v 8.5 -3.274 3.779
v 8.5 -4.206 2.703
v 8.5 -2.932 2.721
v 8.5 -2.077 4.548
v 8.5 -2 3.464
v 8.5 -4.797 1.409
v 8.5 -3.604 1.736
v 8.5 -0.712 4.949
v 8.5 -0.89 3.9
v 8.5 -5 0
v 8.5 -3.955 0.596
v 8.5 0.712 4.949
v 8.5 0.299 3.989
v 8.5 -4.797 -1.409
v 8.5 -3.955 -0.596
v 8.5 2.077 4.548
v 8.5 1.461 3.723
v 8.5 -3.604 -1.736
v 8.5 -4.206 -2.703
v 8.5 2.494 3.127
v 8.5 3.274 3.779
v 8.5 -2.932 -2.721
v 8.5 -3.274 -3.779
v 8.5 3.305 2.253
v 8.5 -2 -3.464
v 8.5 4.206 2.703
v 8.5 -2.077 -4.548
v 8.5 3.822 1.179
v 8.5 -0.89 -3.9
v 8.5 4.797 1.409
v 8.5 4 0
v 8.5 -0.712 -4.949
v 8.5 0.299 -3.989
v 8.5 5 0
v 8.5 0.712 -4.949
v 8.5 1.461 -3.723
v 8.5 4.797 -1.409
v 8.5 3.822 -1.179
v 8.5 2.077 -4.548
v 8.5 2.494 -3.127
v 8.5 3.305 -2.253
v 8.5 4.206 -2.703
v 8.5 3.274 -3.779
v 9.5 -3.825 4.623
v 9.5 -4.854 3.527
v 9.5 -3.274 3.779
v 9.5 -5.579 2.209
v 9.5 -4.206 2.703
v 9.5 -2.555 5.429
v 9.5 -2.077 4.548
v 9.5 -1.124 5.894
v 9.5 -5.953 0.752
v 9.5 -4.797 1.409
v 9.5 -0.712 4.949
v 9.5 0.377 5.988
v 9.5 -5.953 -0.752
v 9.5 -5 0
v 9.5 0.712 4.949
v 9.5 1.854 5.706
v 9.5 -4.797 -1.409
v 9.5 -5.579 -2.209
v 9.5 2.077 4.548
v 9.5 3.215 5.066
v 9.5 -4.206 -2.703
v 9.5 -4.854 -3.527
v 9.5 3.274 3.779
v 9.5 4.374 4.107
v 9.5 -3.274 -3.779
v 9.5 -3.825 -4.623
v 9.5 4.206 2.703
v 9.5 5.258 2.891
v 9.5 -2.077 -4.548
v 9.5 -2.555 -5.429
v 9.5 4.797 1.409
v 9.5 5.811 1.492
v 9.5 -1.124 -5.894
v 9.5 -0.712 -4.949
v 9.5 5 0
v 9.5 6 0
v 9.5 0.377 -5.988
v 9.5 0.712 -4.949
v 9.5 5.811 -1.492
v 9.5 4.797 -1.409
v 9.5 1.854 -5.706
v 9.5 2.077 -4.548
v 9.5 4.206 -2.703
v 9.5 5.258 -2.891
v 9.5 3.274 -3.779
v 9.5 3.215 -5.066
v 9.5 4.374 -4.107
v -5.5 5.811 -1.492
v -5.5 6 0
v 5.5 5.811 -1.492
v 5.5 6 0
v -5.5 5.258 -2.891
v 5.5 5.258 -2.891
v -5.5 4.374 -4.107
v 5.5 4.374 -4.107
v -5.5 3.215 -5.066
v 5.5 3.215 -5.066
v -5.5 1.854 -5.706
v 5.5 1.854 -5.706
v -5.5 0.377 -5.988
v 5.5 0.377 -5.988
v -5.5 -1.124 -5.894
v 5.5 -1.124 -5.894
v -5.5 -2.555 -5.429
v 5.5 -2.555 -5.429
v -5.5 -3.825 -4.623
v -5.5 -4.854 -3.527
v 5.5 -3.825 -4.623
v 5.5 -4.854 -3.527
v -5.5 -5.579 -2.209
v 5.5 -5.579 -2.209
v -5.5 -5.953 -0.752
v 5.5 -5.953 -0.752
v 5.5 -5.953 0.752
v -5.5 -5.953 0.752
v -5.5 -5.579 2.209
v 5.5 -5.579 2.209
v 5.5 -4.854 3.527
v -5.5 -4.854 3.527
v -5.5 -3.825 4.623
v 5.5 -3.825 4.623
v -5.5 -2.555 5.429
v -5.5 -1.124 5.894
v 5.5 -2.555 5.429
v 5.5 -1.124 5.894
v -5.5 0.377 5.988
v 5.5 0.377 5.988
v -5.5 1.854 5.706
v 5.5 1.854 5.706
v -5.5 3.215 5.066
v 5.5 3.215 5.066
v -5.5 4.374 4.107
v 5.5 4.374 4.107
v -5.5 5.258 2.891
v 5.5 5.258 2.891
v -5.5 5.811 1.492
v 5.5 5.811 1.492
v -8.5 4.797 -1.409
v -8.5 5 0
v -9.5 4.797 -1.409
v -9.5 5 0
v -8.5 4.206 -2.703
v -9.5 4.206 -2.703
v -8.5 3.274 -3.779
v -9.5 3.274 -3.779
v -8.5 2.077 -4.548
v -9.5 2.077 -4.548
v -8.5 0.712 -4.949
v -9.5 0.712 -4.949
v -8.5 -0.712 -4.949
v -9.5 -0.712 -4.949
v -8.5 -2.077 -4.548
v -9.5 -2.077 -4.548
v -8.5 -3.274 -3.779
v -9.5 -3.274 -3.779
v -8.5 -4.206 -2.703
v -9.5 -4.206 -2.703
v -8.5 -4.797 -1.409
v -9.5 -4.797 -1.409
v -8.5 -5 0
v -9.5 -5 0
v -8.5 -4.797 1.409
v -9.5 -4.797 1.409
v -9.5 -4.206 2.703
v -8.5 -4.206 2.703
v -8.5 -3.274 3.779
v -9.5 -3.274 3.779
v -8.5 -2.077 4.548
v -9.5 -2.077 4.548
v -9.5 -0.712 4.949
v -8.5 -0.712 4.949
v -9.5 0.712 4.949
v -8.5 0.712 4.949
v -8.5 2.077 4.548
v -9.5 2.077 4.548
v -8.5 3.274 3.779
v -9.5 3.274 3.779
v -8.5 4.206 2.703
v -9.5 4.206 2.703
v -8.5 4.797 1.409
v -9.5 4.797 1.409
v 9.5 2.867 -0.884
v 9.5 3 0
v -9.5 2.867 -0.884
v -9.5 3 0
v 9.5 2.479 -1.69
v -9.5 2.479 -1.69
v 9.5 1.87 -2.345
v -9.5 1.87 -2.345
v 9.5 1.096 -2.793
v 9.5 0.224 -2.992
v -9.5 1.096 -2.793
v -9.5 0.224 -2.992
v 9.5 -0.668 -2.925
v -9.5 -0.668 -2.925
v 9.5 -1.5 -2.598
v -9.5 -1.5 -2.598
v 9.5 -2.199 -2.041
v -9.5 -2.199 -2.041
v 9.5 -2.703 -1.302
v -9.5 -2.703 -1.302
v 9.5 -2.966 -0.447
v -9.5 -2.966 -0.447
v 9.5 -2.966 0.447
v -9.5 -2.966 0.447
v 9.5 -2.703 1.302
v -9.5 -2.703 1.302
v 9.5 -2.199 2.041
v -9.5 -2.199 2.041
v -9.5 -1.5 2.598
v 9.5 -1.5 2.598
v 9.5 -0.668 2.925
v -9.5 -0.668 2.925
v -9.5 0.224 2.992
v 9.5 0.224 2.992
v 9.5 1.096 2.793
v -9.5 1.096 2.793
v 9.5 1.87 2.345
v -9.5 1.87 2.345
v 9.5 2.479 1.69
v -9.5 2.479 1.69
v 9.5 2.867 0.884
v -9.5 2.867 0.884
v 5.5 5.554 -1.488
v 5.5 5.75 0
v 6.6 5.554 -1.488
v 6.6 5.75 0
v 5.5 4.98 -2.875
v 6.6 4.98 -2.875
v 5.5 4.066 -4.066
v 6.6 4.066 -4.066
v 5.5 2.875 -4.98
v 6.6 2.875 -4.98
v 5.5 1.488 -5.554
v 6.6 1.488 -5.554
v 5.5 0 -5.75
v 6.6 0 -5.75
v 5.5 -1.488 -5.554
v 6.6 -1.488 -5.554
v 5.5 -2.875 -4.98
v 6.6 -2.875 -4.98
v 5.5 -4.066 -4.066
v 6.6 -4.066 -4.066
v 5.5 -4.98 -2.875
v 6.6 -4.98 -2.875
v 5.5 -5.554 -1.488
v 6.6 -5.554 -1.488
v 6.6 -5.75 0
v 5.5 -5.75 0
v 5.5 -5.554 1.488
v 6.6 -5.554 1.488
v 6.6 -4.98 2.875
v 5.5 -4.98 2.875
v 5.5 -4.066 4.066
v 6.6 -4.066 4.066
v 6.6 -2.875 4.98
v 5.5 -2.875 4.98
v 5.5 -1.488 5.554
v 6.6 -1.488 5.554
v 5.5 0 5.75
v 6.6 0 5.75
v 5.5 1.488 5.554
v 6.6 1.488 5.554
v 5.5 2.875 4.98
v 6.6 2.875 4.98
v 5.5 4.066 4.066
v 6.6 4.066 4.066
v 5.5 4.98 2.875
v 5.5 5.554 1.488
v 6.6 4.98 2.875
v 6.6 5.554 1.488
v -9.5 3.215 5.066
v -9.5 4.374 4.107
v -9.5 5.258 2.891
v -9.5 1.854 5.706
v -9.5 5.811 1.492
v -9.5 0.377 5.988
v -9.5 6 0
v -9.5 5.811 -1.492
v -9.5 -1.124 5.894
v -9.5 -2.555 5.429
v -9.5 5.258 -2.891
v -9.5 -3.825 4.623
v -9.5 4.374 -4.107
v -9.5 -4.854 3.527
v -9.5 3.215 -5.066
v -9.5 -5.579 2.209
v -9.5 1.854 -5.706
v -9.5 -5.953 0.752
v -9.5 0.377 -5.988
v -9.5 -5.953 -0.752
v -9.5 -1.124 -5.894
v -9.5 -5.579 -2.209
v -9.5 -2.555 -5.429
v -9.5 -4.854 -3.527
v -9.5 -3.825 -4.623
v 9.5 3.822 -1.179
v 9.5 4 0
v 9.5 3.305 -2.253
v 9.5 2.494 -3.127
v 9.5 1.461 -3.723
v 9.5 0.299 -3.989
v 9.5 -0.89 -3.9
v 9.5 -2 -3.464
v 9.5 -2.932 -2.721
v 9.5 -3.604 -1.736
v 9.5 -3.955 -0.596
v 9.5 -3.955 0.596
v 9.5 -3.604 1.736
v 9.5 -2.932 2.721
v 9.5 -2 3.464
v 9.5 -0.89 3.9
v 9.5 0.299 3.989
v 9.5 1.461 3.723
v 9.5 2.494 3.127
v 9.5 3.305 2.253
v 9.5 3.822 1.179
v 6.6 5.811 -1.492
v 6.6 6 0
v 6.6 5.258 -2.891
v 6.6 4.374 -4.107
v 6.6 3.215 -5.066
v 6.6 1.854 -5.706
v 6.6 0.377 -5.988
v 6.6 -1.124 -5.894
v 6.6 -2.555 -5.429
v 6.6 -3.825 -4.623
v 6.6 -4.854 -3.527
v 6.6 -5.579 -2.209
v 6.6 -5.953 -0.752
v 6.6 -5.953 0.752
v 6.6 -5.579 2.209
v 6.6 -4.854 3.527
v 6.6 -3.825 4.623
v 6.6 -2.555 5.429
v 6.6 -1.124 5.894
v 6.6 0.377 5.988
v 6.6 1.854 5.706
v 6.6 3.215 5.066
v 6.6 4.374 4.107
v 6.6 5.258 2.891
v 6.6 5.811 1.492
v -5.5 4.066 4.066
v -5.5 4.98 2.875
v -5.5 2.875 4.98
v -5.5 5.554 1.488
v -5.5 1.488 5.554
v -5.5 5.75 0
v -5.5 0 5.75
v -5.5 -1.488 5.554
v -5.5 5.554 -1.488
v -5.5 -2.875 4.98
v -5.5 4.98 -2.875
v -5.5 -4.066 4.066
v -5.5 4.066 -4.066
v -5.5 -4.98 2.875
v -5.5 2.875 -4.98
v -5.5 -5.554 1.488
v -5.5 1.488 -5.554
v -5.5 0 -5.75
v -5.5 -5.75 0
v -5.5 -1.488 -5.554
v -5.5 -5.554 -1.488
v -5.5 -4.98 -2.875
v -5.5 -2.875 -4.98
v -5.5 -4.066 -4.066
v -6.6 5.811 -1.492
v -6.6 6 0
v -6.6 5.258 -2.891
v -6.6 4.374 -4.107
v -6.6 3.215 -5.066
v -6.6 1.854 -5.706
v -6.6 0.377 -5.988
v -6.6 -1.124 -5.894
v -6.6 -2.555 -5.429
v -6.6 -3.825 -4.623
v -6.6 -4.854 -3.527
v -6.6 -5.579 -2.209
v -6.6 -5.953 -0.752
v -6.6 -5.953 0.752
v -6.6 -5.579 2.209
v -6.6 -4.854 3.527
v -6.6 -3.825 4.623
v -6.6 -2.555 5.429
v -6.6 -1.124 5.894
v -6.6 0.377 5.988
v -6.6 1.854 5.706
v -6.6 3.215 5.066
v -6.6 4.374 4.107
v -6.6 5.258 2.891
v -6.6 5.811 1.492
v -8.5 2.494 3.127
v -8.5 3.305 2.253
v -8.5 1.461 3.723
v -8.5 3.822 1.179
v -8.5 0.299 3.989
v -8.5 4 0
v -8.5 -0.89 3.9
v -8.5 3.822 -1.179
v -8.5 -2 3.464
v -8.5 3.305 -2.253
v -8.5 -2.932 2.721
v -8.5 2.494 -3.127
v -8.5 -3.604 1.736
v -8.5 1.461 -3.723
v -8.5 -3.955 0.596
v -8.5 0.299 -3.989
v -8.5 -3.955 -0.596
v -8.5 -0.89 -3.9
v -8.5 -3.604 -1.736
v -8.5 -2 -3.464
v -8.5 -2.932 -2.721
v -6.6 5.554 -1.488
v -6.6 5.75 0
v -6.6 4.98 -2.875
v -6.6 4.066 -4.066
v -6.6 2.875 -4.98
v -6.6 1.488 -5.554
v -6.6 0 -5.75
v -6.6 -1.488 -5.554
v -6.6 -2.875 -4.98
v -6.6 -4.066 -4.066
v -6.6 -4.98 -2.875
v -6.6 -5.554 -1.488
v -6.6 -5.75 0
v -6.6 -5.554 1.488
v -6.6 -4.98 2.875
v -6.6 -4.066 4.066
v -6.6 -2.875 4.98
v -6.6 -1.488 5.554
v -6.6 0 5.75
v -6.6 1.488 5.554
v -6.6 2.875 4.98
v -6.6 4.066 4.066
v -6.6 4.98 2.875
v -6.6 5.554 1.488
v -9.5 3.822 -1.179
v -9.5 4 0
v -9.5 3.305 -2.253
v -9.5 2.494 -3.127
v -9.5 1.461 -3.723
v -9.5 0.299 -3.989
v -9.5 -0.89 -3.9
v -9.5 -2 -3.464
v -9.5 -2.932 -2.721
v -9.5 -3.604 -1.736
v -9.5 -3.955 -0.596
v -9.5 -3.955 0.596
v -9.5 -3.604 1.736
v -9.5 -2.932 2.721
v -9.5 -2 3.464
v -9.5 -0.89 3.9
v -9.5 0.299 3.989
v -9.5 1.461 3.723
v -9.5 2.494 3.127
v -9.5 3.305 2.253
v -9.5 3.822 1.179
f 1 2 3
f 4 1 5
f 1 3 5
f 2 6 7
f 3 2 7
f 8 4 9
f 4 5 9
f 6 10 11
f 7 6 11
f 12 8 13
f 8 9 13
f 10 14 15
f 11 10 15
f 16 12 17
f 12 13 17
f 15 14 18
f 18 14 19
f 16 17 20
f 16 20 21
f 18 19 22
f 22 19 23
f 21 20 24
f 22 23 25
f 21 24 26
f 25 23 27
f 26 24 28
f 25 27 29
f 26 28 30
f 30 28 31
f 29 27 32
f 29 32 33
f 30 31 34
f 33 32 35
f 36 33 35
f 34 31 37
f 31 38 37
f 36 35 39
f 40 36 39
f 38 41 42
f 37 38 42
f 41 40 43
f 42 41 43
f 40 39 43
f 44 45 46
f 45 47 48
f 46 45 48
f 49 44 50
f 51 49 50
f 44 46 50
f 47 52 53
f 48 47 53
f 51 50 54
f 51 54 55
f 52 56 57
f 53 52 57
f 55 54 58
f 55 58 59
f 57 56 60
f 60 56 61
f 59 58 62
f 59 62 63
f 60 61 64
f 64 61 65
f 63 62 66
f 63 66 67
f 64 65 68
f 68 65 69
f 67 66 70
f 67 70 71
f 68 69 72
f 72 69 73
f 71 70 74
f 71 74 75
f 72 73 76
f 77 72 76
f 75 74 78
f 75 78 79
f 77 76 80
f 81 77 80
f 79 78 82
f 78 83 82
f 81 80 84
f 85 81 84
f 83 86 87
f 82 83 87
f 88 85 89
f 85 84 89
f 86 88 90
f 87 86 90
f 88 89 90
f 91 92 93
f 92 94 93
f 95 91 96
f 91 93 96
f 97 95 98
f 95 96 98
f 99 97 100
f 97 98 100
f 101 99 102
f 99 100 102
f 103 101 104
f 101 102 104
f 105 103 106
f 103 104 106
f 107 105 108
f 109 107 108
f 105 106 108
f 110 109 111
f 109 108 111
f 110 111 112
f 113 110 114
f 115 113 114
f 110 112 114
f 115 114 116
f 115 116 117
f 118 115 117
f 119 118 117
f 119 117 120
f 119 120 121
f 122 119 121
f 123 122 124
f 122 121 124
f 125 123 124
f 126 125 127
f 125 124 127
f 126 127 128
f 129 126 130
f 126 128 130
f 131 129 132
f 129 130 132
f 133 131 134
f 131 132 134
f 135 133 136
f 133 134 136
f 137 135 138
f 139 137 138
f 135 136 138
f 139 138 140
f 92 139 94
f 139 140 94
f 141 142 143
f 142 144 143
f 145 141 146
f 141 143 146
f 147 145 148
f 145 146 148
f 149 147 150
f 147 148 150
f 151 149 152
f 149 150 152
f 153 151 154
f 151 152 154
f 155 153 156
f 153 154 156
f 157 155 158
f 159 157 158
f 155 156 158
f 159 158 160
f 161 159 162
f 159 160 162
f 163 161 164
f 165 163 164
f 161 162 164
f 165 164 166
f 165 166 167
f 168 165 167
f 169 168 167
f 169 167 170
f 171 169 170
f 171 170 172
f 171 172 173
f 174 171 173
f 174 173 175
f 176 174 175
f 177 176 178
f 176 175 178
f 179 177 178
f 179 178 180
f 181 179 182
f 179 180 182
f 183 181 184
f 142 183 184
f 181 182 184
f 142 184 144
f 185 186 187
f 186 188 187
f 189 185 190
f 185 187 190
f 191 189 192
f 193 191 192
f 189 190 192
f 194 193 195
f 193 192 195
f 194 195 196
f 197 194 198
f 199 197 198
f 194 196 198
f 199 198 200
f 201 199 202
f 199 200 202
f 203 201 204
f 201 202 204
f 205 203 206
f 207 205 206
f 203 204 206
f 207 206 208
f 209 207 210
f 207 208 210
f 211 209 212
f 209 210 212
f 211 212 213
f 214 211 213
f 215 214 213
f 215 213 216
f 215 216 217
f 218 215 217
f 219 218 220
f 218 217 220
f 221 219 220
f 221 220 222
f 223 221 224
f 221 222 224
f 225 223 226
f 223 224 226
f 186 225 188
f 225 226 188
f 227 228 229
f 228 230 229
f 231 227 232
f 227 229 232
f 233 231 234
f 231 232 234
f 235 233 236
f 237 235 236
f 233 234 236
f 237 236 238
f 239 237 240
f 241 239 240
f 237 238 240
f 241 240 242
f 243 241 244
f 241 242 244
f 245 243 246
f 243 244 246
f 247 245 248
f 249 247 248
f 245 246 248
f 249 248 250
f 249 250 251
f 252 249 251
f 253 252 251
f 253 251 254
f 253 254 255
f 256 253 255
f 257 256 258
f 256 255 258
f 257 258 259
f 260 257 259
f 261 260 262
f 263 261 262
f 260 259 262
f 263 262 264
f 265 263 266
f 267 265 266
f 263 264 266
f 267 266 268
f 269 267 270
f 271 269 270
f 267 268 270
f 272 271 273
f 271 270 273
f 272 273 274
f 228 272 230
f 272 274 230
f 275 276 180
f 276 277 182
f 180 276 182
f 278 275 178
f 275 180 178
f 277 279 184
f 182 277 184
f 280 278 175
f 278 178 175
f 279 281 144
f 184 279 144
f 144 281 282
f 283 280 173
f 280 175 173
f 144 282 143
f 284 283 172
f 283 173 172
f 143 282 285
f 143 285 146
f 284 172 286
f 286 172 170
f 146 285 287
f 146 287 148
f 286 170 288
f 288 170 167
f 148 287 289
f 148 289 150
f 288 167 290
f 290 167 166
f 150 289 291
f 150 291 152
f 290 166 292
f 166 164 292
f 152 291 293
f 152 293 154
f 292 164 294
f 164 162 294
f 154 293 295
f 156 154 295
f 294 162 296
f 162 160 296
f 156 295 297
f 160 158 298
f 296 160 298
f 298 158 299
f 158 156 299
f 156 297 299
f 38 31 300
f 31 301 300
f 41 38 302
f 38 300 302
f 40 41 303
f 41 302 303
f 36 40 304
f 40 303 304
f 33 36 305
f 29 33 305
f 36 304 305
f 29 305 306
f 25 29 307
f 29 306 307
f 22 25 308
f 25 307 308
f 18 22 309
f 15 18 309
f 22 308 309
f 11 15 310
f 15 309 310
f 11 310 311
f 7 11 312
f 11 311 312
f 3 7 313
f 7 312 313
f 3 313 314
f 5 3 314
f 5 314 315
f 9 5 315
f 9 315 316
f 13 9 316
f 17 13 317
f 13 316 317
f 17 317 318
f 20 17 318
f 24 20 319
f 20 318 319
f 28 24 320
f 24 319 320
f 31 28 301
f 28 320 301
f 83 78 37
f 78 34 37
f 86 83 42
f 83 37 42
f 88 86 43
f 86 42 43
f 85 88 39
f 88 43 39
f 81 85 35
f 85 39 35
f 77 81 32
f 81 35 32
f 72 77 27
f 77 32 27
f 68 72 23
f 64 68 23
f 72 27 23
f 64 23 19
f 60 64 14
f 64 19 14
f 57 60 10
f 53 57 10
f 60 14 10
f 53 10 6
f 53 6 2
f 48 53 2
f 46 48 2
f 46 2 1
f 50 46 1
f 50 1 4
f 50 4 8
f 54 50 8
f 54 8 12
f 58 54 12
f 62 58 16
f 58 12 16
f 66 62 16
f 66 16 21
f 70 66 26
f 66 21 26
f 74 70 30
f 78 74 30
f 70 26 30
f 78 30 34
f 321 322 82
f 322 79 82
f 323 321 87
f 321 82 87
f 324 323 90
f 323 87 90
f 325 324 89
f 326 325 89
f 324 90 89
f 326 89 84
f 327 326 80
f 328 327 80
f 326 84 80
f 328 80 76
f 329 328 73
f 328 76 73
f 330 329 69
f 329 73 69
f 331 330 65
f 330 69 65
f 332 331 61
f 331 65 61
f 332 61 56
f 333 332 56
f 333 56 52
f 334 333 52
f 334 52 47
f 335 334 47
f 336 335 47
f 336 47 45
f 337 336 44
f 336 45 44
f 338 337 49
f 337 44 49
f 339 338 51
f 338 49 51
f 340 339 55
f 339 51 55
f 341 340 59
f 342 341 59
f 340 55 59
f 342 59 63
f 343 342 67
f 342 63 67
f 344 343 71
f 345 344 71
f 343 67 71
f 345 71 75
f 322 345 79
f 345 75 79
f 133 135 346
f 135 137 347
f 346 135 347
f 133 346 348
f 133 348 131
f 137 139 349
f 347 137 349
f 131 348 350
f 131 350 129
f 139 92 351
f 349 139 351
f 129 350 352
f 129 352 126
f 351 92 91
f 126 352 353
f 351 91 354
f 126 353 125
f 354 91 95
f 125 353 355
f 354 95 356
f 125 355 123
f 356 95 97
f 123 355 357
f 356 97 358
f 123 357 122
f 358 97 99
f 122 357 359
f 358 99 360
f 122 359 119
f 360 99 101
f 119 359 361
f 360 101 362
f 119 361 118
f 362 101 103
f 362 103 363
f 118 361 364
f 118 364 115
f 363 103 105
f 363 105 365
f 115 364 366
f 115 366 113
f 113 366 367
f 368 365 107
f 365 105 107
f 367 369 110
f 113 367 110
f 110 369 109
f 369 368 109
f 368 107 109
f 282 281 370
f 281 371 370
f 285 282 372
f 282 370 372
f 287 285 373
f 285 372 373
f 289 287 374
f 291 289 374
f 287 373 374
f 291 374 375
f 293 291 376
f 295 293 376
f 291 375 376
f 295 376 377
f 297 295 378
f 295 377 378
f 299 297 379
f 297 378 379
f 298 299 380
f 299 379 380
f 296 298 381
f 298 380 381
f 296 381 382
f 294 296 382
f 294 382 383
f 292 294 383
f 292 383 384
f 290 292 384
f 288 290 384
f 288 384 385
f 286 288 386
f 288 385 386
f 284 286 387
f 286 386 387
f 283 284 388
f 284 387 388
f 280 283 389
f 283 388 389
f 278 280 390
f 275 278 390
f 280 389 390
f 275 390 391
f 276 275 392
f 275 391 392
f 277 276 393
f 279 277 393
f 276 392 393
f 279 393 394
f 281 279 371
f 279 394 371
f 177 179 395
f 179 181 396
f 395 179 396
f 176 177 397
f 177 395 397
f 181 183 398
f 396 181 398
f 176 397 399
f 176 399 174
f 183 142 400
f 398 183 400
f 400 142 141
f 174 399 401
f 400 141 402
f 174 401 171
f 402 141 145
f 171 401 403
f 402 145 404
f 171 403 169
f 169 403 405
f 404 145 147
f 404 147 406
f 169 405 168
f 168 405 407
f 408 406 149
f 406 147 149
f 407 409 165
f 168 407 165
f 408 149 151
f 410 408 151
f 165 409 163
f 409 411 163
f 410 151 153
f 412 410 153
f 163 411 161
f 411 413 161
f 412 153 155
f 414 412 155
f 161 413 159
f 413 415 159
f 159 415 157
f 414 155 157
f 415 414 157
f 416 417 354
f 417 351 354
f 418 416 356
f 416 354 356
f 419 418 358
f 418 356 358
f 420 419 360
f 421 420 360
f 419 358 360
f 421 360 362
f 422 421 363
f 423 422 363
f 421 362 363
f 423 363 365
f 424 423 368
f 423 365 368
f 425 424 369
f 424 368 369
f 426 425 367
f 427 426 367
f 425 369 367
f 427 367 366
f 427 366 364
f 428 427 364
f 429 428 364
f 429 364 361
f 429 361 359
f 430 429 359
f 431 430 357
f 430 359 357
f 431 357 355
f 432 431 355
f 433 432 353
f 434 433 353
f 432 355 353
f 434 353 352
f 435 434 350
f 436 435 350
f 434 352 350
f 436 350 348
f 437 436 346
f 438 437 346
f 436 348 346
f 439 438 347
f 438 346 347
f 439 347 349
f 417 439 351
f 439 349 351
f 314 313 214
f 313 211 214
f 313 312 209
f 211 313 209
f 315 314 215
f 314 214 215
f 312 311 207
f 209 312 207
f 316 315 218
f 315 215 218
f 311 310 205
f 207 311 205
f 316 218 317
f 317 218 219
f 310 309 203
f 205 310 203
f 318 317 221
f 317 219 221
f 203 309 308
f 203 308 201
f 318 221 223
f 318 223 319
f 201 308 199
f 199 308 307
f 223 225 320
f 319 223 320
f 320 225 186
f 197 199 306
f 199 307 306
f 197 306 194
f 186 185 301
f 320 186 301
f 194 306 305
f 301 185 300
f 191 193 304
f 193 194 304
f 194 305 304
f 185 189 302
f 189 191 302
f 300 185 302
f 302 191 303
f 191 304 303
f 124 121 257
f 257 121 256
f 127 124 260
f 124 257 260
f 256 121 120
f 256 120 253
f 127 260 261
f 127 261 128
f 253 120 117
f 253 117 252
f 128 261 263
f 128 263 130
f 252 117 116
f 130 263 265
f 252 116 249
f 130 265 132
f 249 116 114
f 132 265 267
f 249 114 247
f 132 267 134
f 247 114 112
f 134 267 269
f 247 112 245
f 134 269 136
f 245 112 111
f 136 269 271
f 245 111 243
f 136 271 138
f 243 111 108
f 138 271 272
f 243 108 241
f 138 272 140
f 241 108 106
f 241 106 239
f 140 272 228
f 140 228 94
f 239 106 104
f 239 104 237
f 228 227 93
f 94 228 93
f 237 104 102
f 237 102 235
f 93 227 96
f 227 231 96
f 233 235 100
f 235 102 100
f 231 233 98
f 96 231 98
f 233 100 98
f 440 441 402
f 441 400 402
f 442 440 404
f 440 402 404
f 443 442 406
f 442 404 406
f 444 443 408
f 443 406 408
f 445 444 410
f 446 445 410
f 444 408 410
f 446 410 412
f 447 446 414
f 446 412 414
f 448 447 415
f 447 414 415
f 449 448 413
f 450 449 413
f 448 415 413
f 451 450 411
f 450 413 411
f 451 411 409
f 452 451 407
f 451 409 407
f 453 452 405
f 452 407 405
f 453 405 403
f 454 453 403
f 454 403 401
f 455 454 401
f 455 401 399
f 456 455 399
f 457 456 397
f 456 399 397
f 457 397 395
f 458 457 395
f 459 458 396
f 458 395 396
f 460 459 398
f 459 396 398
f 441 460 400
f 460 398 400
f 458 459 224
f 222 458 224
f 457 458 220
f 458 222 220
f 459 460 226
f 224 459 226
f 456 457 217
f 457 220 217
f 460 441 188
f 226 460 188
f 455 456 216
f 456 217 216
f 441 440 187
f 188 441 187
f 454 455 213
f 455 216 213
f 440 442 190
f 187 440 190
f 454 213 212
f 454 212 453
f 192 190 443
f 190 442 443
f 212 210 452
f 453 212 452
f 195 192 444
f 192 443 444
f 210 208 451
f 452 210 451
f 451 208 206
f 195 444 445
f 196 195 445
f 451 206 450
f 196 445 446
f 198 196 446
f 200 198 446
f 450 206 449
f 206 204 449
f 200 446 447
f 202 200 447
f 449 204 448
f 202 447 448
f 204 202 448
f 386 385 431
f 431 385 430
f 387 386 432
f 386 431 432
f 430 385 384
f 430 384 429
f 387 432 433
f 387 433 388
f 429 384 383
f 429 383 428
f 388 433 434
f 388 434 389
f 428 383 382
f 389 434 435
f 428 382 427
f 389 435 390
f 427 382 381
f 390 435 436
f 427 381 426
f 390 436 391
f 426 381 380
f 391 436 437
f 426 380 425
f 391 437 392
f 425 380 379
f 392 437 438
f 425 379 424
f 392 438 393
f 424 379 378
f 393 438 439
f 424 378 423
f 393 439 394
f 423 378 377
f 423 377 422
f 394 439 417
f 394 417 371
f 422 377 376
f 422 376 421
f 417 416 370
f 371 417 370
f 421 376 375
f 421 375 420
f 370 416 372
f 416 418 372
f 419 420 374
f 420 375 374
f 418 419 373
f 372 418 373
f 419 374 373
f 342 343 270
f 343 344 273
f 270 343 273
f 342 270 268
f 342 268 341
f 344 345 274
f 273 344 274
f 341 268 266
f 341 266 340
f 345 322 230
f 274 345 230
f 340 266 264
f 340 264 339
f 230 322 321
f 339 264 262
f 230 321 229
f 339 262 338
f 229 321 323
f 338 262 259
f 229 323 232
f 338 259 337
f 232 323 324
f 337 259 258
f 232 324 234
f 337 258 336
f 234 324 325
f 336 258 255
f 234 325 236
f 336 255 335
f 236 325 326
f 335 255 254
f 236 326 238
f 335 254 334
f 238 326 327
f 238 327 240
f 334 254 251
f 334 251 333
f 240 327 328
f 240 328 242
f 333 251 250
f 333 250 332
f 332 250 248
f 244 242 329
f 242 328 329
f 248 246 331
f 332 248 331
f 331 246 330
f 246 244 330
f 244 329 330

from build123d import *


with BuildPart() as part:
    # Esboço1 → Revolução1 (revolve)
    with BuildSketch(Plane.XY):
        Polygon((-9.5, 6), (-6.6, 6), (-6.6, 5.75), (-5.5, 5.75), (-5.5, 6), (5.5, 6), (5.5, 5.75), (6.6, 5.75), (6.6, 6), (9.5, 6), (9.5, 5), (8.5, 5), (8.5, 4), (9.5, 4), (9.5, 3), (-9.5, 3), (-9.5, 4), (-8.5, 4), (-8.5, 5), (-9.5, 5), align=None)
    revolve(axis=Axis((0, 0, 0), (-1, 0, 0)))


solid = part.part
